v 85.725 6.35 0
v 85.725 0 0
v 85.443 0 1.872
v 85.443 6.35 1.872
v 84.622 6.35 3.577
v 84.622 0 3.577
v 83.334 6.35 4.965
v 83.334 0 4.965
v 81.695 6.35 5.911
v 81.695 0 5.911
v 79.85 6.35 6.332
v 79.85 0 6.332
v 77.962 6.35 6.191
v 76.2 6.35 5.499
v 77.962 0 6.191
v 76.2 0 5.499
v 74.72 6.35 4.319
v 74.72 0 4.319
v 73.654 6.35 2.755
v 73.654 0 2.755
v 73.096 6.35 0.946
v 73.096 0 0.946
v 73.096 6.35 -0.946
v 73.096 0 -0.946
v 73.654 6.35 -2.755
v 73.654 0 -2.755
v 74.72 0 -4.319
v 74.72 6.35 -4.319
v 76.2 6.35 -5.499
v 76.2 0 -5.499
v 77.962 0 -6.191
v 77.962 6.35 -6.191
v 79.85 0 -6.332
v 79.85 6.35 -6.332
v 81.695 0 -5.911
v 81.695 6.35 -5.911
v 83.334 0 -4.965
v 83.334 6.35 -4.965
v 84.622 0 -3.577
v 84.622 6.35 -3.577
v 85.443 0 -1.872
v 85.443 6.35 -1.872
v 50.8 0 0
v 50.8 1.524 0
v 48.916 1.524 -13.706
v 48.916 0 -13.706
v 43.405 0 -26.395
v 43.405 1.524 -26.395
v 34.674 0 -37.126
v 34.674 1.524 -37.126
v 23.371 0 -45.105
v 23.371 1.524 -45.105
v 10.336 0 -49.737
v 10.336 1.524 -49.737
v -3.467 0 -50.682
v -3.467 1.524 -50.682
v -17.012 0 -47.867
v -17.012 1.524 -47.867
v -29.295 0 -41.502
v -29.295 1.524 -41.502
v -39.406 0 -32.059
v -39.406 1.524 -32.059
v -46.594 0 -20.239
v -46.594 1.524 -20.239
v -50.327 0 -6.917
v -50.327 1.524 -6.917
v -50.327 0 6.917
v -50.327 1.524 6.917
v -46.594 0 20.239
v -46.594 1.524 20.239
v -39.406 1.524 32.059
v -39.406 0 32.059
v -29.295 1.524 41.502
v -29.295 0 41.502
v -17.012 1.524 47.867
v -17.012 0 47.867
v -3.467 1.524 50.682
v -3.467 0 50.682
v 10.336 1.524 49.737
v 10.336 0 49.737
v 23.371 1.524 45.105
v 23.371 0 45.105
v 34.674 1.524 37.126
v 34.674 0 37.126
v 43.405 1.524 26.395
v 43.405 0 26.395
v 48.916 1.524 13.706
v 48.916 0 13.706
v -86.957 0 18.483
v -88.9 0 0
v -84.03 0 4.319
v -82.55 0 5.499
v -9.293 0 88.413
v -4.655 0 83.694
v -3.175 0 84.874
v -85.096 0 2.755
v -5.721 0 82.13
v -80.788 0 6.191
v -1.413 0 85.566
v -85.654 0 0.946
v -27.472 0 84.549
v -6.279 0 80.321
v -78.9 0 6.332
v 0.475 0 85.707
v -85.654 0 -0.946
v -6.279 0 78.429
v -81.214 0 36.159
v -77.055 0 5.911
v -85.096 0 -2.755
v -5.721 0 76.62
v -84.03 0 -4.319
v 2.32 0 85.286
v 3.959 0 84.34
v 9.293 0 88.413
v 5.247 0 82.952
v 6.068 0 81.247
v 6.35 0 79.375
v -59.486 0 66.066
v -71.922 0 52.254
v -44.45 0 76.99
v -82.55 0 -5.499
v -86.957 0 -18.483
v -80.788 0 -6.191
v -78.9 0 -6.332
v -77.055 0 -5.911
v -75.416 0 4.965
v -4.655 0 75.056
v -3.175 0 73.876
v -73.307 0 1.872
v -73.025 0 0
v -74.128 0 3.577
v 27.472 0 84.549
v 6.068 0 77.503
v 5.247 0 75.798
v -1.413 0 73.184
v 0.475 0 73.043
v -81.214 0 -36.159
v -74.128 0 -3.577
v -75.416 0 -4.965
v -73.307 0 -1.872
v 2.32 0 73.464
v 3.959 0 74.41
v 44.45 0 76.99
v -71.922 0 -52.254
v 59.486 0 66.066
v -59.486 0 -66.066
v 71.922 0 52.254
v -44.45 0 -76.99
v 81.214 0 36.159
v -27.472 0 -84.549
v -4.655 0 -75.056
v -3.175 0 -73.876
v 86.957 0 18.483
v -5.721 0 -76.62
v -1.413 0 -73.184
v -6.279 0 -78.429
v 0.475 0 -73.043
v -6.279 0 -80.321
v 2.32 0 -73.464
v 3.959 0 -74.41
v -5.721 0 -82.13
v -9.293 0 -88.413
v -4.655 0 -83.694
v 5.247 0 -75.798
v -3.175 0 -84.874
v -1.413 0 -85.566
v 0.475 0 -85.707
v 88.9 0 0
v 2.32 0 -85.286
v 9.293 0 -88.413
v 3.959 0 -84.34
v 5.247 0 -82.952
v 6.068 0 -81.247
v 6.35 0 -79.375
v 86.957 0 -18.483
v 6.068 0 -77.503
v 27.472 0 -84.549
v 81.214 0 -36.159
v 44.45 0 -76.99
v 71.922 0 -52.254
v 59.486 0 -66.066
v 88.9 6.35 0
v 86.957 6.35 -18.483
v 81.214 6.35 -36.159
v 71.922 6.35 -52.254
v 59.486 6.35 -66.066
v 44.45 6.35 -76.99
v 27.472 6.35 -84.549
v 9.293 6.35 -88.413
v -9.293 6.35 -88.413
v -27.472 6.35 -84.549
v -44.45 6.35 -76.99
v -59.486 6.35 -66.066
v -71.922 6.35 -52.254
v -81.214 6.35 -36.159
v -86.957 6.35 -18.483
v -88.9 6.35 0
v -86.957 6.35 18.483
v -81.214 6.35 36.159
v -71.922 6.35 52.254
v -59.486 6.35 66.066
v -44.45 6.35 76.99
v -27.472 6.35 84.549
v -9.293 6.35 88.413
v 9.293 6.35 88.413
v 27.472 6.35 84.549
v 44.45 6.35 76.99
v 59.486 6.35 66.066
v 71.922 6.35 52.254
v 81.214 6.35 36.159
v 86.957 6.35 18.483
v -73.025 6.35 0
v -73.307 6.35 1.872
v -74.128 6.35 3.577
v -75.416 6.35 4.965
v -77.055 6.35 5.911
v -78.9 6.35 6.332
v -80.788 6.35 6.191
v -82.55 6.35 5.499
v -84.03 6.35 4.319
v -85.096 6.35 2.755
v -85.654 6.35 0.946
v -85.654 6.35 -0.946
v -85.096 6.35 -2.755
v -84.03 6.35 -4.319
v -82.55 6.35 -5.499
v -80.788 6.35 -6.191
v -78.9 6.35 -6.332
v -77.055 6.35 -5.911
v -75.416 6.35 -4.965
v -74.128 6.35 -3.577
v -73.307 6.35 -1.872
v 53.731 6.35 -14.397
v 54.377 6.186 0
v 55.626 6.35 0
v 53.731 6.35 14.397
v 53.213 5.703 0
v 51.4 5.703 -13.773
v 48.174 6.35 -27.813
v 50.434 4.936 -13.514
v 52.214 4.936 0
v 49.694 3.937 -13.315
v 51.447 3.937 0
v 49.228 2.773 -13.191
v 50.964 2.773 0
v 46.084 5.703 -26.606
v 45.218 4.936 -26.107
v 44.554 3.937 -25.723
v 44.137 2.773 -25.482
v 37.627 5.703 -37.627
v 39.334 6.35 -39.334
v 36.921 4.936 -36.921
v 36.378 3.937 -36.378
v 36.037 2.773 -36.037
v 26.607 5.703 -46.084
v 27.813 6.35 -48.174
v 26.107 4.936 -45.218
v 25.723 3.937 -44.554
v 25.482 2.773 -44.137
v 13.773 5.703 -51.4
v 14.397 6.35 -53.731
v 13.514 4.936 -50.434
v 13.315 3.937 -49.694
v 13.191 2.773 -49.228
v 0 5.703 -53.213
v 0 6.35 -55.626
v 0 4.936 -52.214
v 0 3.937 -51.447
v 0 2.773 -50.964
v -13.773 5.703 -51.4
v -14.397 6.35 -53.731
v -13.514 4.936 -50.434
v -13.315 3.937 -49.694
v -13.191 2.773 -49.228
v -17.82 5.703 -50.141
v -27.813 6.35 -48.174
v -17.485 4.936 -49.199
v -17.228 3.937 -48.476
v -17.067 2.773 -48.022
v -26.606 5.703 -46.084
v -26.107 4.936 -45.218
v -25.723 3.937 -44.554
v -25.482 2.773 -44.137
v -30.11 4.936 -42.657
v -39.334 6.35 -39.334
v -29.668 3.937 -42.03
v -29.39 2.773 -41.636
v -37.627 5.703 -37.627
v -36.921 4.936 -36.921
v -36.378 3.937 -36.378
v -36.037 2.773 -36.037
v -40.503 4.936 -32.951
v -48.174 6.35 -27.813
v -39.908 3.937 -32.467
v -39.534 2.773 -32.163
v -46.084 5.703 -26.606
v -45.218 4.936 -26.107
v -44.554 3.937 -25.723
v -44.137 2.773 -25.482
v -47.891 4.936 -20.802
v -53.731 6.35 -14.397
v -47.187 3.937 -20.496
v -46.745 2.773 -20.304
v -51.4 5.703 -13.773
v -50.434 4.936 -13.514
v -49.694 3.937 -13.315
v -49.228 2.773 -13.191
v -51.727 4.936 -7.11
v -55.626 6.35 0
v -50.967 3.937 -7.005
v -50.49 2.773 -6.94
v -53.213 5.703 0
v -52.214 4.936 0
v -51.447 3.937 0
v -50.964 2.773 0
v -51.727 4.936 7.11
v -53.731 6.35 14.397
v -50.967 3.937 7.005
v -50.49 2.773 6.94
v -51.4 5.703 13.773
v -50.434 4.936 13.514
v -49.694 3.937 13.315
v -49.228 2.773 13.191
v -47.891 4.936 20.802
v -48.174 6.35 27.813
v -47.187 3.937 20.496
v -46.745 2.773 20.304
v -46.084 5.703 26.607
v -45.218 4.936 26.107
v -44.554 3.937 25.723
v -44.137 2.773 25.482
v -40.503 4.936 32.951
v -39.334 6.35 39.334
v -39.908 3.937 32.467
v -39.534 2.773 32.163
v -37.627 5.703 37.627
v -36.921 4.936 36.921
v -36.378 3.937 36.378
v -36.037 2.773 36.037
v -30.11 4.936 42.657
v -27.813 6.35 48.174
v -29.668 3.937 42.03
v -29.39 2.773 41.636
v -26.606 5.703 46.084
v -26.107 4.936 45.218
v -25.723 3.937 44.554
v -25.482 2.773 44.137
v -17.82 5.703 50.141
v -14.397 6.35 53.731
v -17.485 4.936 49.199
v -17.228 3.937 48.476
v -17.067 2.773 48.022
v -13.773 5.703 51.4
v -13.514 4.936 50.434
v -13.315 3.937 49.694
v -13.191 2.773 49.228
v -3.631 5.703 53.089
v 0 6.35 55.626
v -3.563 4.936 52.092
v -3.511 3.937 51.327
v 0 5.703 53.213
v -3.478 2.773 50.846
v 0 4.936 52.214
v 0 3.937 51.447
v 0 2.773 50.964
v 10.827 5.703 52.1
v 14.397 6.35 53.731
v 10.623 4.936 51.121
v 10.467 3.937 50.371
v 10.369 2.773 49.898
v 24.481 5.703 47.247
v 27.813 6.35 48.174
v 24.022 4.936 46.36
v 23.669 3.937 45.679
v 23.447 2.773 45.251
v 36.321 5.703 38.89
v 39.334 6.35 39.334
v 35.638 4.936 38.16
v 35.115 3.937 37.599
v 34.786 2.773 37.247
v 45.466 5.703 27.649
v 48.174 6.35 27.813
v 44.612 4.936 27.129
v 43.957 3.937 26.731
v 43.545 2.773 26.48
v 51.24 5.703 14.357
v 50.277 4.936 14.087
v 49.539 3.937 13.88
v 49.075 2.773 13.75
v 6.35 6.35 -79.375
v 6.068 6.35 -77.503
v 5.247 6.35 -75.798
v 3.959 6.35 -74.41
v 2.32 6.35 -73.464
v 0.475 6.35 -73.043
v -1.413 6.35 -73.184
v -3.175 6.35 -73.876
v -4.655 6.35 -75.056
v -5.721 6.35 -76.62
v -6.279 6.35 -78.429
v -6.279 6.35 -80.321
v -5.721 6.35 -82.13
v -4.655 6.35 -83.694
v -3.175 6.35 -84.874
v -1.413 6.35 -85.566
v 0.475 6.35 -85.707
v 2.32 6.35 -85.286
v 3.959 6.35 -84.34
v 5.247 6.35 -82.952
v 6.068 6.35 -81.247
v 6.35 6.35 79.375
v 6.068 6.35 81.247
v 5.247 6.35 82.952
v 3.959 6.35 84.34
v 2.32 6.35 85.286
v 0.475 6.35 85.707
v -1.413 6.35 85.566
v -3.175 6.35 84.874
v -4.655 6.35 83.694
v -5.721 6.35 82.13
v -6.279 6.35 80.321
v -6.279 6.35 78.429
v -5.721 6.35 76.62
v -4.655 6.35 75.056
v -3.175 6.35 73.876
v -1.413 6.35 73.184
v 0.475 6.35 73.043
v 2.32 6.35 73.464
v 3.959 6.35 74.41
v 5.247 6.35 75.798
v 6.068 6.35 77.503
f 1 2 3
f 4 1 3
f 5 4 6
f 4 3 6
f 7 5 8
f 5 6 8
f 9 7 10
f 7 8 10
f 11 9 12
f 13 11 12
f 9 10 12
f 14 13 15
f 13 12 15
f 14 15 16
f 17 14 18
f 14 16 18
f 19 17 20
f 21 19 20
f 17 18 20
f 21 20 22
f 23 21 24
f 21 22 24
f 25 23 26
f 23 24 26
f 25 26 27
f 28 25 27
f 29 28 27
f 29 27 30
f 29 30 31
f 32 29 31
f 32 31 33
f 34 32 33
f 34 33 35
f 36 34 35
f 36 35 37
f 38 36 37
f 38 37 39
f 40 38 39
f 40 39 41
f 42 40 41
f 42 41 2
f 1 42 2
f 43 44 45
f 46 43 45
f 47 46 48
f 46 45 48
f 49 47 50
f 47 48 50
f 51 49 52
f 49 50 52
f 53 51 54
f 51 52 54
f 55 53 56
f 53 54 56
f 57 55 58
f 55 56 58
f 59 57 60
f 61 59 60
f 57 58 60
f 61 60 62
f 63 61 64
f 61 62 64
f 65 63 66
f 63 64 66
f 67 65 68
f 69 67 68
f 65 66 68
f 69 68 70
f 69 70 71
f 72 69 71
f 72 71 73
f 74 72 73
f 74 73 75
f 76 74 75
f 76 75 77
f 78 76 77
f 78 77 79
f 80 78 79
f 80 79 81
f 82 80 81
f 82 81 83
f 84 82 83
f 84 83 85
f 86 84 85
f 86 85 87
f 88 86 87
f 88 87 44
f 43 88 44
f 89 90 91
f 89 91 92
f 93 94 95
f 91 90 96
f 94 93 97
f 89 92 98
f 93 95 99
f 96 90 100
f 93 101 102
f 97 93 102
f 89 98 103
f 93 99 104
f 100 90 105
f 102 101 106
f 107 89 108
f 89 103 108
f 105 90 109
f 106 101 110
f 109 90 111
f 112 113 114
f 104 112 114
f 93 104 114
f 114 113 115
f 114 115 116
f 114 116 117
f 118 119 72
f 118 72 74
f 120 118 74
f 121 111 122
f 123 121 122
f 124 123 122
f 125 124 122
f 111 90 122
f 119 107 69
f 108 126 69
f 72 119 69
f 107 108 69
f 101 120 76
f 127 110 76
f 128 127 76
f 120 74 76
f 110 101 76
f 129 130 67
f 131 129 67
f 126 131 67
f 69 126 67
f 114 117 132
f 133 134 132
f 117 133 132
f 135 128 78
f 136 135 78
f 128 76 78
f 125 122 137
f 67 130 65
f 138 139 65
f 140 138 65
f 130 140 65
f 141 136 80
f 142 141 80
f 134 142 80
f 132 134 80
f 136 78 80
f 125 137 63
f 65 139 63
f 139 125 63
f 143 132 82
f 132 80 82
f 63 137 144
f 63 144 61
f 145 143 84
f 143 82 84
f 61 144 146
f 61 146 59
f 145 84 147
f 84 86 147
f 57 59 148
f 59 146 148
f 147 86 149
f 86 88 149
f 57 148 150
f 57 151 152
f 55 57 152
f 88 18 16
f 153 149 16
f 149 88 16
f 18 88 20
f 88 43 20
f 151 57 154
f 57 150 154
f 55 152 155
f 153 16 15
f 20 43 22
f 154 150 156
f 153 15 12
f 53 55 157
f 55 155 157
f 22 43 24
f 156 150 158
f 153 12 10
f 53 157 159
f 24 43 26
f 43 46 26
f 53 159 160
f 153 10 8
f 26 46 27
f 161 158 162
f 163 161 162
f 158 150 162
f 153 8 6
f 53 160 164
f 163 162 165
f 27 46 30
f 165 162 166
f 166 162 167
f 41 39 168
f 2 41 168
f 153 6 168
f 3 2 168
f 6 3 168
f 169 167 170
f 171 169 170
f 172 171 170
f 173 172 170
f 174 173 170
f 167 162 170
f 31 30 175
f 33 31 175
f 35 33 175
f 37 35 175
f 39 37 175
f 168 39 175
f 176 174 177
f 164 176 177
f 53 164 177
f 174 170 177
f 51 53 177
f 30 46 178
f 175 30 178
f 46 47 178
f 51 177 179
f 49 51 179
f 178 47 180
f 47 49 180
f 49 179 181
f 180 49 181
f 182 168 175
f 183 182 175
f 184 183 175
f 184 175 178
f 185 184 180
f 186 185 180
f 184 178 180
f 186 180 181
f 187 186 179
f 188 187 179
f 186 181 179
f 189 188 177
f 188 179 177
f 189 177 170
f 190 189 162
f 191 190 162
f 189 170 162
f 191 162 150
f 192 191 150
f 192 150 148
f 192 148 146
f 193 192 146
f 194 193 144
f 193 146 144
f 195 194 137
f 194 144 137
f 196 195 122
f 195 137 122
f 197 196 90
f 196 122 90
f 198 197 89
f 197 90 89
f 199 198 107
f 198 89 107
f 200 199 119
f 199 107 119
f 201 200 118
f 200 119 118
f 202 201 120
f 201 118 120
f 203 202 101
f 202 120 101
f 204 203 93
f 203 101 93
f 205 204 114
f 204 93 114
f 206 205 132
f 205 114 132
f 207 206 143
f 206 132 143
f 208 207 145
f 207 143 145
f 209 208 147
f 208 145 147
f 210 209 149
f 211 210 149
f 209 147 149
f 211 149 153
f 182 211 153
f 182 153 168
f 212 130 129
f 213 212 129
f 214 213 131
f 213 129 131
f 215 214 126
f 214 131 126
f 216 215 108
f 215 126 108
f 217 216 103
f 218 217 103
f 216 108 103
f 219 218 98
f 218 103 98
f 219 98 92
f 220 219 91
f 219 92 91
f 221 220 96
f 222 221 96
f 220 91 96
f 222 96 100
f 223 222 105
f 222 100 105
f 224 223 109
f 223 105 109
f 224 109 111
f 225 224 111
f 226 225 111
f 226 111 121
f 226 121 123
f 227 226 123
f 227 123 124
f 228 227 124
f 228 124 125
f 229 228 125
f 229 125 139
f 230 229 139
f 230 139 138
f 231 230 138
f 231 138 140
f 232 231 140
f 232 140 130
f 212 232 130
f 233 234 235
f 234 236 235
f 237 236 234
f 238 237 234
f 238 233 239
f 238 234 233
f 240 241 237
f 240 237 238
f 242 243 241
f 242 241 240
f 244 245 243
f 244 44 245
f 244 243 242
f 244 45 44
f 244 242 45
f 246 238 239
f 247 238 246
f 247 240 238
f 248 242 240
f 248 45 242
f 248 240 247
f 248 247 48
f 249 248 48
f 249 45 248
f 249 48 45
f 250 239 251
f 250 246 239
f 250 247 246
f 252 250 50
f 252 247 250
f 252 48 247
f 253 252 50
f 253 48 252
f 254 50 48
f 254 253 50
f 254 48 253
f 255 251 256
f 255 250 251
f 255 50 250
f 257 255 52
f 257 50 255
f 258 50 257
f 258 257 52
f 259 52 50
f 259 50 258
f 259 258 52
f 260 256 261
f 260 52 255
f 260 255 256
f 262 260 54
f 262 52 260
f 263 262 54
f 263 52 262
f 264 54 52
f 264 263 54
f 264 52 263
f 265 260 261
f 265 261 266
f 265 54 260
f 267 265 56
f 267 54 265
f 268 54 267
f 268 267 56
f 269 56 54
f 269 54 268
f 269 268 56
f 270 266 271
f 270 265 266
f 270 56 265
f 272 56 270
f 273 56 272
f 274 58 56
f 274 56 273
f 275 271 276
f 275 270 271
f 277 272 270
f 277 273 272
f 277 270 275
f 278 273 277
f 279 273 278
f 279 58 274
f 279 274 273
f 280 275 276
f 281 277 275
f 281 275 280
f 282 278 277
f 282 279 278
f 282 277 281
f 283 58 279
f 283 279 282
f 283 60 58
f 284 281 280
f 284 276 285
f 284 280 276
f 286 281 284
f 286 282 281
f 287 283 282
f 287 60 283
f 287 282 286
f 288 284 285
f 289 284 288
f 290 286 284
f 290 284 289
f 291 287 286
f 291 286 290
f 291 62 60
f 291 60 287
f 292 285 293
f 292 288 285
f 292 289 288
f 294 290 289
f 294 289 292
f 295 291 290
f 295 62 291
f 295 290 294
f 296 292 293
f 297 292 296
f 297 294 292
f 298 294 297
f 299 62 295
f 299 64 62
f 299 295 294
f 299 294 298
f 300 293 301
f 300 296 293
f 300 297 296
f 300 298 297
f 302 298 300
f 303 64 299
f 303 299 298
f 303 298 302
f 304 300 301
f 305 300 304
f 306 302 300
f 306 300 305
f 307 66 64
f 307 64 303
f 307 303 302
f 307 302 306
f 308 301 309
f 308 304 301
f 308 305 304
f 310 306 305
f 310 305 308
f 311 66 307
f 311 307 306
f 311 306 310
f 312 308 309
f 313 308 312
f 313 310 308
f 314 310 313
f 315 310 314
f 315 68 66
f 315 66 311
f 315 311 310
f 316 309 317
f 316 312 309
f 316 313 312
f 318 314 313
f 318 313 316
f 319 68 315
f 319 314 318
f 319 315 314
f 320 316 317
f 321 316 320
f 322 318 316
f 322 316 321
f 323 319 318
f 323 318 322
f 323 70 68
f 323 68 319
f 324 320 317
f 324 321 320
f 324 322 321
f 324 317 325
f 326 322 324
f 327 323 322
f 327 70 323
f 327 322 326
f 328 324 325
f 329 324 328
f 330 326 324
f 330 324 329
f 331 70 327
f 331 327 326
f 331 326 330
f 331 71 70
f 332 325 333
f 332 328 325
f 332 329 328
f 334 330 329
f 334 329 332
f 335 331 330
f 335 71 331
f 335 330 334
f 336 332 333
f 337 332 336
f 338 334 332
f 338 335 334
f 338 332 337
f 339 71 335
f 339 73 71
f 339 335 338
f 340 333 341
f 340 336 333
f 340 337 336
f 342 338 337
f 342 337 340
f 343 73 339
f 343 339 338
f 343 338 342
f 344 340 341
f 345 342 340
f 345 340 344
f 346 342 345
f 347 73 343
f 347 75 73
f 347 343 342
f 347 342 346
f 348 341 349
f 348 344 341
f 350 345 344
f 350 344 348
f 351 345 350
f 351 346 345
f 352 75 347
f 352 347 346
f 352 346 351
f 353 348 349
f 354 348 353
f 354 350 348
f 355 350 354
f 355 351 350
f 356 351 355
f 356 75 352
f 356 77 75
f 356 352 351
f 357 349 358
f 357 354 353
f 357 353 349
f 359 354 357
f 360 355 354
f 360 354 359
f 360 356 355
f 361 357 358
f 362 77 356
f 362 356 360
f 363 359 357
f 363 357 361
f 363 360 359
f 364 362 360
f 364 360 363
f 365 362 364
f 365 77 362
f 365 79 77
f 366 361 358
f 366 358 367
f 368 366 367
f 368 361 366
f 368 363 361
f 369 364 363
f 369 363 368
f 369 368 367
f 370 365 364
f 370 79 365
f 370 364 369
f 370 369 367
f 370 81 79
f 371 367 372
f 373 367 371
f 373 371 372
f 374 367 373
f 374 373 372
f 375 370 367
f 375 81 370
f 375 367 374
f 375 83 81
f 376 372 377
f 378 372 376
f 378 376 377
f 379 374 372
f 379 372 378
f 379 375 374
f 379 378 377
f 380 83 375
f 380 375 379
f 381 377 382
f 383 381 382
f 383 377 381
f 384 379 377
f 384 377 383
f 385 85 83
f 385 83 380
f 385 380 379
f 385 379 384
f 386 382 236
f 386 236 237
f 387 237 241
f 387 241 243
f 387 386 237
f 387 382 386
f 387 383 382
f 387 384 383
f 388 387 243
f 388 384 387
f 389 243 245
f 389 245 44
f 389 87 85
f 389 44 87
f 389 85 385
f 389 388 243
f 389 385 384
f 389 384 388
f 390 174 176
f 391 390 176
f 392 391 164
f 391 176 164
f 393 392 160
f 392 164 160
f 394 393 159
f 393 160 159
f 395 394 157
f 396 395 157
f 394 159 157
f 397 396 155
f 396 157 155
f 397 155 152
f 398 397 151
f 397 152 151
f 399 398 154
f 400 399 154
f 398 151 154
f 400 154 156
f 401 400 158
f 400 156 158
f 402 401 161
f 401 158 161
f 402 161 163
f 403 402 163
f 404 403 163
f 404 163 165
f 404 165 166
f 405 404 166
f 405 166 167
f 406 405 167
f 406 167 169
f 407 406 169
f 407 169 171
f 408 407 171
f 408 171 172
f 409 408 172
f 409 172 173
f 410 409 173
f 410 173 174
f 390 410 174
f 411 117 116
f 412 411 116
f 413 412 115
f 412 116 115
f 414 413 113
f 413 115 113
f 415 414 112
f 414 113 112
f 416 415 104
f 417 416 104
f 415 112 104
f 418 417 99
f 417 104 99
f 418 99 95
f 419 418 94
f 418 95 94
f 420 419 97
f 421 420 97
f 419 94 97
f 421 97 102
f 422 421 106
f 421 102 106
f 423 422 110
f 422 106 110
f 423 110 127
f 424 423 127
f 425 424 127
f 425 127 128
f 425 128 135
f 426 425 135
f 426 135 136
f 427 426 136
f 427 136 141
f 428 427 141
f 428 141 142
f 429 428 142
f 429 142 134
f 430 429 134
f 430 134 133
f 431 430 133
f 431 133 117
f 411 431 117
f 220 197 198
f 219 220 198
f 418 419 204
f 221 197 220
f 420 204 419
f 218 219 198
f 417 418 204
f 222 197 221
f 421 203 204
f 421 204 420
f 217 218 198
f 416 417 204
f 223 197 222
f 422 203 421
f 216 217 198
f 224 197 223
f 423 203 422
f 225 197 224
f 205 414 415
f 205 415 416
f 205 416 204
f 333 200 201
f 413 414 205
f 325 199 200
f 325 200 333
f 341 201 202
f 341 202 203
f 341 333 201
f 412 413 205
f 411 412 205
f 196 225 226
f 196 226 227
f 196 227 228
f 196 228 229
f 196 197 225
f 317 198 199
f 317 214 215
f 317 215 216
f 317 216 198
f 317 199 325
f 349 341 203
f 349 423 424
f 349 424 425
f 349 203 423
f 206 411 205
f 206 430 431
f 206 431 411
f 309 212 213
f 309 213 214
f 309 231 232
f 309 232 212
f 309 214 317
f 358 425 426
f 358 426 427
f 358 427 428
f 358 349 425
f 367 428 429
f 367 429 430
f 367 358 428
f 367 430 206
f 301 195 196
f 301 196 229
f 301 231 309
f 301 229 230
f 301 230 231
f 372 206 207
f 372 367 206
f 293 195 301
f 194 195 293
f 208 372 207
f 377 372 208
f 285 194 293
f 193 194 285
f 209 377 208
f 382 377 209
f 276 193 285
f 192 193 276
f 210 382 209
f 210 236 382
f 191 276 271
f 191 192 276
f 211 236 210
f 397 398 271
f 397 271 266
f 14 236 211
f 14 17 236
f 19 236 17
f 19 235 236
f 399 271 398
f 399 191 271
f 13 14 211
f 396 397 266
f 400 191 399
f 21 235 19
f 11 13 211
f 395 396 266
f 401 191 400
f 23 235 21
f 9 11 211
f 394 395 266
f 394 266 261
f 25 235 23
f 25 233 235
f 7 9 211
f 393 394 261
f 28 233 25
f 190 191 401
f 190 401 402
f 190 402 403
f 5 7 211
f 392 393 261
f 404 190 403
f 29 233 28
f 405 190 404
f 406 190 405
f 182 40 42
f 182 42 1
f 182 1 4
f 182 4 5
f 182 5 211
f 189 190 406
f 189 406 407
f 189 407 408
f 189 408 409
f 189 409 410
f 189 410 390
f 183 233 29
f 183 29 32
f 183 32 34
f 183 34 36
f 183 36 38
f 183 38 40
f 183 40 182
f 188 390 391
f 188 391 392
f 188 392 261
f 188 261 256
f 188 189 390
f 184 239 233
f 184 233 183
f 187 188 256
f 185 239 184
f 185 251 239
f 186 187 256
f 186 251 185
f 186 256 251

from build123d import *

# Parameters (mm, degrees)
SKETCH1_R           = 88.9
BOSS_EXTRUDE1_DEPTH = 6.35
SKETCH2_R           = 50.8
CUT_EXTRUDE1_DEPTH  = 7.35
FILLET2_R           = 4.826
SKETCH3_R           = 6.35
CUT_EXTRUDE2_DEPTH  = 7.35


with BuildPart() as part:
    # Sketch1 → Boss-Extrude1 (new body)
    with BuildSketch(Plane(origin=(0, 0, 0), x_dir=(1, 0, 0), z_dir=(0, 1, 0))):
        Circle(SKETCH1_R)
    extrude(amount=BOSS_EXTRUDE1_DEPTH)

    # Sketch2 → Cut-Extrude1 (cut, through all)
    with BuildSketch(Plane(origin=(0, 6.35, 0), x_dir=(1, 0, 0), z_dir=(0, 1, 0))):
        Circle(SKETCH2_R)
    extrude(amount=-CUT_EXTRUDE1_DEPTH, mode=Mode.SUBTRACT)

    # Fillet2
    fillet2_edges = [part.edges().sort_by_distance(p)[0] for p in [
        (-50.8, 6.35, 0),
    ]]
    fillet(fillet2_edges, radius=FILLET2_R)

    # Sketch3 → Cut-Extrude2 (cut, through all)
    with BuildSketch(Plane.XZ):
        with Locations((0, -79.375)):
            Circle(SKETCH3_R)
        with Locations((79.375, 0)):
            Circle(SKETCH3_R)
        with Locations((-79.375, 0)):
            Circle(SKETCH3_R)
        with Locations((0, 79.375)):
            Circle(SKETCH3_R)
    extrude(amount=-CUT_EXTRUDE2_DEPTH, mode=Mode.SUBTRACT)


solid = part.part
